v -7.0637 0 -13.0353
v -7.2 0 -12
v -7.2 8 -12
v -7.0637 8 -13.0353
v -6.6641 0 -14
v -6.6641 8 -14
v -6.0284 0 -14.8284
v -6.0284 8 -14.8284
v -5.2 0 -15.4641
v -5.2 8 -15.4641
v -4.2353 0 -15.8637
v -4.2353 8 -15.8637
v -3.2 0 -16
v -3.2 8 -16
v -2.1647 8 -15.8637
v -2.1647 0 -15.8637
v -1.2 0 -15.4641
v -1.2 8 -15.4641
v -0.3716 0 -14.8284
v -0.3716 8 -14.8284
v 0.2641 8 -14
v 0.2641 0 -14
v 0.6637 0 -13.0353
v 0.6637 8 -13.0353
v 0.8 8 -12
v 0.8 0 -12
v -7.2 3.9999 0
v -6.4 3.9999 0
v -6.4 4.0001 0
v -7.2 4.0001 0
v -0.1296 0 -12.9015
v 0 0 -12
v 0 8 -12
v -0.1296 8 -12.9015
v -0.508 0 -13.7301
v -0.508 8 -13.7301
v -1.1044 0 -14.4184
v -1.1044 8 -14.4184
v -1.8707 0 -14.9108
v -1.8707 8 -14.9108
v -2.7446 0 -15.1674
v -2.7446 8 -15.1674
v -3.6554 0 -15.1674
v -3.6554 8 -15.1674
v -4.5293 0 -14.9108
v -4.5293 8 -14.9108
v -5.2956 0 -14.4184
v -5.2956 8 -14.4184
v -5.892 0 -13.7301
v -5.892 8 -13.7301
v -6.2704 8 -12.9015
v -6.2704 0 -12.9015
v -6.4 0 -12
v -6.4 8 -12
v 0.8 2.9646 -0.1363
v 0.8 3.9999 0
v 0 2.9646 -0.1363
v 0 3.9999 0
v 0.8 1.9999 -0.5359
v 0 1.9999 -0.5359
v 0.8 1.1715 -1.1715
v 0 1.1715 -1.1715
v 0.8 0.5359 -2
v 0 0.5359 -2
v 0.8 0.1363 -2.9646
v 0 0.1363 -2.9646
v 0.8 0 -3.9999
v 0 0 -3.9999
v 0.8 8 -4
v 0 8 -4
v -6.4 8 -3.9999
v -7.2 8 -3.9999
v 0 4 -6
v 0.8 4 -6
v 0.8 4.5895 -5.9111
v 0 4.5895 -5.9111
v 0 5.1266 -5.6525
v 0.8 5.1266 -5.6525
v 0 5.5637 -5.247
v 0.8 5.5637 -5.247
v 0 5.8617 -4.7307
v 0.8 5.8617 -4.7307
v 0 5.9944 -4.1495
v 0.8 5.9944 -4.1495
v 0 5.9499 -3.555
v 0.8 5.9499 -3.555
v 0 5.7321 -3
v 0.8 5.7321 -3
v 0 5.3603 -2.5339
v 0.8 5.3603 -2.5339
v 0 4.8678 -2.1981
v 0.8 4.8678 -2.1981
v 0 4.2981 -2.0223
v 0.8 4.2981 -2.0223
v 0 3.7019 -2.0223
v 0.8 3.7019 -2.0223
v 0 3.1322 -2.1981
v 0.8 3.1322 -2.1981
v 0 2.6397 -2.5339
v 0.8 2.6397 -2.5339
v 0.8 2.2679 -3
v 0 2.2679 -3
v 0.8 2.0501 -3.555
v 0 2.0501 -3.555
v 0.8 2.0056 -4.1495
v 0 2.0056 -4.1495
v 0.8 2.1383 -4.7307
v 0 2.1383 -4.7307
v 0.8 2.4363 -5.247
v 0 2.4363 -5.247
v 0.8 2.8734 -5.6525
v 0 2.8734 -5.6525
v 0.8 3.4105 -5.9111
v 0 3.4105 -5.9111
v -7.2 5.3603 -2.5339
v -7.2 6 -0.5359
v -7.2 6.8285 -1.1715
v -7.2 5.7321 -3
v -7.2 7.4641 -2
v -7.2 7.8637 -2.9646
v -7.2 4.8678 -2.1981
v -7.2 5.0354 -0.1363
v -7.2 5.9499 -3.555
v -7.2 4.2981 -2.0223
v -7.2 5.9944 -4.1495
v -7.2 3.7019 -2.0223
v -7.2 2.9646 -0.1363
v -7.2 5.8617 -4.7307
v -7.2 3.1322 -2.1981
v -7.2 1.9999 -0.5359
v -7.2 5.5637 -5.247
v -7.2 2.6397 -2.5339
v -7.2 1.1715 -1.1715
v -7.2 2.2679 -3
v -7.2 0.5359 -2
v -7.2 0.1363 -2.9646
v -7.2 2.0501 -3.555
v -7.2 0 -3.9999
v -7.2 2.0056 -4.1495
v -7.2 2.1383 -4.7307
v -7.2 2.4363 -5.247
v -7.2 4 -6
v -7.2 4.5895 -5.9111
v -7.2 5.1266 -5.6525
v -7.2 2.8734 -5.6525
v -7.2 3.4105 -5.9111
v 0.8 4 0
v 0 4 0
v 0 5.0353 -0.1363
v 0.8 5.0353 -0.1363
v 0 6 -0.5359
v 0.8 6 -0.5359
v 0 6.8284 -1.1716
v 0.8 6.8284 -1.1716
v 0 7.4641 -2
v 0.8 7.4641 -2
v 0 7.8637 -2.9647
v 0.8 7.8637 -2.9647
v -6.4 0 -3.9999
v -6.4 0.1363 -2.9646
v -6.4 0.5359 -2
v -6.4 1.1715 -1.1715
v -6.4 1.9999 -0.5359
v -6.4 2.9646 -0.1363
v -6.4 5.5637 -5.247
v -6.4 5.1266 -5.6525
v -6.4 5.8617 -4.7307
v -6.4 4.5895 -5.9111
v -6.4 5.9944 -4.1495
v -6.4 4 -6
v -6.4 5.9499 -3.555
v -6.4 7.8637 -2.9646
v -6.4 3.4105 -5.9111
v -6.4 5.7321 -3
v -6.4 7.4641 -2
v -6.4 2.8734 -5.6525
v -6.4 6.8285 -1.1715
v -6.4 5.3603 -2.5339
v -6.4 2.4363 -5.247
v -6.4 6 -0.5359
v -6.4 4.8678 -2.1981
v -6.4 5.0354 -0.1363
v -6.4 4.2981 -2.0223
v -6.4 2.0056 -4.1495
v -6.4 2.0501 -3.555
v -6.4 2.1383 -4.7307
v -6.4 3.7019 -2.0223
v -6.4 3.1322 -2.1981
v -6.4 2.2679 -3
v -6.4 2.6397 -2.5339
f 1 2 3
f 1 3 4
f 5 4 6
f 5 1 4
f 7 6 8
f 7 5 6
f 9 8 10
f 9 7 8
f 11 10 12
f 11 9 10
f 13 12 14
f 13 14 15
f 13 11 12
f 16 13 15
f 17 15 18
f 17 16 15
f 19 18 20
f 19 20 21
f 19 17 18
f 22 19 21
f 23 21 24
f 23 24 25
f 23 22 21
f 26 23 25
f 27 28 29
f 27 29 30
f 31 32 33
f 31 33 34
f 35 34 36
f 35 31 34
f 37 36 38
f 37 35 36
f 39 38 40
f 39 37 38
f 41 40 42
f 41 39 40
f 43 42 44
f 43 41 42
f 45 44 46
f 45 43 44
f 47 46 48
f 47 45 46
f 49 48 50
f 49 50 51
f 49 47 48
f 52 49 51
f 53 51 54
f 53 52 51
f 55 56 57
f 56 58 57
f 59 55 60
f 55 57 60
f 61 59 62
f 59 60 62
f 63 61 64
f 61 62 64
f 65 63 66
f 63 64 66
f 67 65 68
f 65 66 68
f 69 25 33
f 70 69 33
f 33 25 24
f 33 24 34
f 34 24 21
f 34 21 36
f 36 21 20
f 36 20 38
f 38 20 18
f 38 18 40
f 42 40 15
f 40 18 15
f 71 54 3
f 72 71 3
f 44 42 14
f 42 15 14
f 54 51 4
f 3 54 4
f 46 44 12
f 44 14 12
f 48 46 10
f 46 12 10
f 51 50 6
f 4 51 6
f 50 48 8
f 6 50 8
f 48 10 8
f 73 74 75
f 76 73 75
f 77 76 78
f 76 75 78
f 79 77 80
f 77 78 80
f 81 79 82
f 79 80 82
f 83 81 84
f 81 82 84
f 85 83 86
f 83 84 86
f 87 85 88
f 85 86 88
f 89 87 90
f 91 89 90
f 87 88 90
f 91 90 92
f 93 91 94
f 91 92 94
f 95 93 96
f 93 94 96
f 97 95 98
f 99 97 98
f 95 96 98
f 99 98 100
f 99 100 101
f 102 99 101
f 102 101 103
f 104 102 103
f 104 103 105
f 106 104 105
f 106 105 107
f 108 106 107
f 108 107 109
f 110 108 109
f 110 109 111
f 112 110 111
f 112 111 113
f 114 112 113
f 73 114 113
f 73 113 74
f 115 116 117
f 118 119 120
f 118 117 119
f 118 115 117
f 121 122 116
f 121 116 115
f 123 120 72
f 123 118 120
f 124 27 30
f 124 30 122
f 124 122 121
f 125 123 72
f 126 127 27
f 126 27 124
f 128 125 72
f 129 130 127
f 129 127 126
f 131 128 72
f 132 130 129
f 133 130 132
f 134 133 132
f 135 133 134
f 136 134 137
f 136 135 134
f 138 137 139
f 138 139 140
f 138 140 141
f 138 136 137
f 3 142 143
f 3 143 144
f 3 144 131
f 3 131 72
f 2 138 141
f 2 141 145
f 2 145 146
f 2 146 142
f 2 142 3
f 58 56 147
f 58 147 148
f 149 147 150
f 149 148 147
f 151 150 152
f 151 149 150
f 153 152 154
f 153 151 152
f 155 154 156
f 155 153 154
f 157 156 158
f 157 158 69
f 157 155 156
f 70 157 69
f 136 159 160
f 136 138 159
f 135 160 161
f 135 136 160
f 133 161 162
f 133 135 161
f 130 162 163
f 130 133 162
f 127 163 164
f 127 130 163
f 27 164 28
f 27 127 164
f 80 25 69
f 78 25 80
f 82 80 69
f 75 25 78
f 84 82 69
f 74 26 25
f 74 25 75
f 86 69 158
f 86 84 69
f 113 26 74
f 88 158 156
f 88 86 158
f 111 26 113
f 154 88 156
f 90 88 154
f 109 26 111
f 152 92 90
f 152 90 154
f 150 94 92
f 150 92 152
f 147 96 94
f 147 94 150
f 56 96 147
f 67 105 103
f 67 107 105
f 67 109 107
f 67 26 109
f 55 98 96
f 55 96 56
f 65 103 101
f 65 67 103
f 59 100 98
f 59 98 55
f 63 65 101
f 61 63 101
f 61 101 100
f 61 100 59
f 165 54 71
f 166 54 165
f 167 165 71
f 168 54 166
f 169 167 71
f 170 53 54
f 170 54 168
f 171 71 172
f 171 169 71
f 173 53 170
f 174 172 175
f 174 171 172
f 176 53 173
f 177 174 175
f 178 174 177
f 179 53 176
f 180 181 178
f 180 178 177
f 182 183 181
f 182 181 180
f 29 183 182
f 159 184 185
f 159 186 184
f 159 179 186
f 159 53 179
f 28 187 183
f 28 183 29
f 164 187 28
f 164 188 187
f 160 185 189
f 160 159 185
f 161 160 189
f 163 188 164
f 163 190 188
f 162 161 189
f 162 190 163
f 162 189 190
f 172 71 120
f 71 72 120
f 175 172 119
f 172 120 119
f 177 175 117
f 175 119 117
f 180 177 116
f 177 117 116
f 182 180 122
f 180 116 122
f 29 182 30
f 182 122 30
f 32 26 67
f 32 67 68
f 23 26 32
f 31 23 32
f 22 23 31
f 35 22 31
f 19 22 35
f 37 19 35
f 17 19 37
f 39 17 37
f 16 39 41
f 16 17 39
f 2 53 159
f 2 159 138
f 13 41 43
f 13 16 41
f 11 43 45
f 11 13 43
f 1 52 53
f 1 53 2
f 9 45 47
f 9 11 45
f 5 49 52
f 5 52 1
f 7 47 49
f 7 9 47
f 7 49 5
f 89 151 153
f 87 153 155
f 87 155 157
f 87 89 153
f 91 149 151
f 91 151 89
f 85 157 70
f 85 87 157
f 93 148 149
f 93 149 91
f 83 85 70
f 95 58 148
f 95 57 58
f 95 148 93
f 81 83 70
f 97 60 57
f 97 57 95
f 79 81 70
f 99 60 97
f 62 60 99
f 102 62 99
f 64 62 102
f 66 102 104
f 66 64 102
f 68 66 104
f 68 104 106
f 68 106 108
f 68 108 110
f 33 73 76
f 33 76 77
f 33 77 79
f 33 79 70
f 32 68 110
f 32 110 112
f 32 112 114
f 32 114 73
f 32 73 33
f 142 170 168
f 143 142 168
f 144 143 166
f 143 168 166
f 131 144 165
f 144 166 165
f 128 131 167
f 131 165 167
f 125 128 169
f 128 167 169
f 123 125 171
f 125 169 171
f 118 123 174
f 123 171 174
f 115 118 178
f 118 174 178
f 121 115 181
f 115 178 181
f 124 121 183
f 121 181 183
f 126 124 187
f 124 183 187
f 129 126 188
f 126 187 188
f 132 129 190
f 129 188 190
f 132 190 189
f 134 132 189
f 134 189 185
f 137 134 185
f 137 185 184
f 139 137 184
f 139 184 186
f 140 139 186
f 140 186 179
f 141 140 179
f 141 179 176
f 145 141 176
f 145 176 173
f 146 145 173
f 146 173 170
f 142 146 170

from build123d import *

# Parameters (mm, degrees)
BOSS_EXTRUDE1_DEPTH = 8
FILLET1_R           = 4
FILLET2_R           = 4
FILLET3_R           = 4
SKETCH2_R           = 2
CUT_EXTRUDE1_DEPTH  = 20.595917942


with BuildPart() as part:
    # Sketch1 → Boss-Extrude1 (new body)
    with BuildSketch(Plane(origin=(0, 0, 0), x_dir=(1, 0, 0), z_dir=(0, 1, 0))):
        with BuildLine():
            Line((0, 0), (0, 12))
            ThreePointArc((0, 12), (-3.2, 15.2), (-6.4, 12))
            Line((-6.4, 12), (-6.4, 0))
            Line((-6.4, 0), (-7.2, 0))
            Line((-7.2, 0), (-7.2, 12))
            ThreePointArc((-7.2, 12), (-3.2, 16), (0.8, 12))
            Line((0.8, 12), (0.8, 0))
            Line((0.8, 0), (0, 0))
        make_face()
    extrude(amount=BOSS_EXTRUDE1_DEPTH)

    # Fillet1
    fillet1_edges = [part.edges().sort_by_distance(p)[0] for p in [
        (0.4, 8, 0),
    ]]
    fillet(fillet1_edges, radius=FILLET1_R)

    # Fillet2
    fillet2_edges = [part.edges().sort_by_distance(p)[0] for p in [
        (0.4, 0, 0),
    ]]
    fillet(fillet2_edges, radius=FILLET2_R - 0.0001)  # a hair under: the kernel refuses the full size

    # Fillet3
    fillet3_edges = [part.edges().sort_by_distance(p)[0] for p in [
        (-6.8, 0, 0),
        (-6.8, 8, 0),
    ]]
    fillet(fillet3_edges, radius=FILLET3_R - 0.0001)  # a hair under: the kernel refuses the full size

    # Sketch2 → Cut-Extrude1 (cut, through all)
    with BuildSketch(Plane(origin=(0.8, 0, 0), x_dir=(0, 0, -1), z_dir=(1, 0, 0))):
        with Locations((4, 4)):
            Circle(SKETCH2_R)
    extrude(amount=-CUT_EXTRUDE1_DEPTH, mode=Mode.SUBTRACT)


solid = part.part
